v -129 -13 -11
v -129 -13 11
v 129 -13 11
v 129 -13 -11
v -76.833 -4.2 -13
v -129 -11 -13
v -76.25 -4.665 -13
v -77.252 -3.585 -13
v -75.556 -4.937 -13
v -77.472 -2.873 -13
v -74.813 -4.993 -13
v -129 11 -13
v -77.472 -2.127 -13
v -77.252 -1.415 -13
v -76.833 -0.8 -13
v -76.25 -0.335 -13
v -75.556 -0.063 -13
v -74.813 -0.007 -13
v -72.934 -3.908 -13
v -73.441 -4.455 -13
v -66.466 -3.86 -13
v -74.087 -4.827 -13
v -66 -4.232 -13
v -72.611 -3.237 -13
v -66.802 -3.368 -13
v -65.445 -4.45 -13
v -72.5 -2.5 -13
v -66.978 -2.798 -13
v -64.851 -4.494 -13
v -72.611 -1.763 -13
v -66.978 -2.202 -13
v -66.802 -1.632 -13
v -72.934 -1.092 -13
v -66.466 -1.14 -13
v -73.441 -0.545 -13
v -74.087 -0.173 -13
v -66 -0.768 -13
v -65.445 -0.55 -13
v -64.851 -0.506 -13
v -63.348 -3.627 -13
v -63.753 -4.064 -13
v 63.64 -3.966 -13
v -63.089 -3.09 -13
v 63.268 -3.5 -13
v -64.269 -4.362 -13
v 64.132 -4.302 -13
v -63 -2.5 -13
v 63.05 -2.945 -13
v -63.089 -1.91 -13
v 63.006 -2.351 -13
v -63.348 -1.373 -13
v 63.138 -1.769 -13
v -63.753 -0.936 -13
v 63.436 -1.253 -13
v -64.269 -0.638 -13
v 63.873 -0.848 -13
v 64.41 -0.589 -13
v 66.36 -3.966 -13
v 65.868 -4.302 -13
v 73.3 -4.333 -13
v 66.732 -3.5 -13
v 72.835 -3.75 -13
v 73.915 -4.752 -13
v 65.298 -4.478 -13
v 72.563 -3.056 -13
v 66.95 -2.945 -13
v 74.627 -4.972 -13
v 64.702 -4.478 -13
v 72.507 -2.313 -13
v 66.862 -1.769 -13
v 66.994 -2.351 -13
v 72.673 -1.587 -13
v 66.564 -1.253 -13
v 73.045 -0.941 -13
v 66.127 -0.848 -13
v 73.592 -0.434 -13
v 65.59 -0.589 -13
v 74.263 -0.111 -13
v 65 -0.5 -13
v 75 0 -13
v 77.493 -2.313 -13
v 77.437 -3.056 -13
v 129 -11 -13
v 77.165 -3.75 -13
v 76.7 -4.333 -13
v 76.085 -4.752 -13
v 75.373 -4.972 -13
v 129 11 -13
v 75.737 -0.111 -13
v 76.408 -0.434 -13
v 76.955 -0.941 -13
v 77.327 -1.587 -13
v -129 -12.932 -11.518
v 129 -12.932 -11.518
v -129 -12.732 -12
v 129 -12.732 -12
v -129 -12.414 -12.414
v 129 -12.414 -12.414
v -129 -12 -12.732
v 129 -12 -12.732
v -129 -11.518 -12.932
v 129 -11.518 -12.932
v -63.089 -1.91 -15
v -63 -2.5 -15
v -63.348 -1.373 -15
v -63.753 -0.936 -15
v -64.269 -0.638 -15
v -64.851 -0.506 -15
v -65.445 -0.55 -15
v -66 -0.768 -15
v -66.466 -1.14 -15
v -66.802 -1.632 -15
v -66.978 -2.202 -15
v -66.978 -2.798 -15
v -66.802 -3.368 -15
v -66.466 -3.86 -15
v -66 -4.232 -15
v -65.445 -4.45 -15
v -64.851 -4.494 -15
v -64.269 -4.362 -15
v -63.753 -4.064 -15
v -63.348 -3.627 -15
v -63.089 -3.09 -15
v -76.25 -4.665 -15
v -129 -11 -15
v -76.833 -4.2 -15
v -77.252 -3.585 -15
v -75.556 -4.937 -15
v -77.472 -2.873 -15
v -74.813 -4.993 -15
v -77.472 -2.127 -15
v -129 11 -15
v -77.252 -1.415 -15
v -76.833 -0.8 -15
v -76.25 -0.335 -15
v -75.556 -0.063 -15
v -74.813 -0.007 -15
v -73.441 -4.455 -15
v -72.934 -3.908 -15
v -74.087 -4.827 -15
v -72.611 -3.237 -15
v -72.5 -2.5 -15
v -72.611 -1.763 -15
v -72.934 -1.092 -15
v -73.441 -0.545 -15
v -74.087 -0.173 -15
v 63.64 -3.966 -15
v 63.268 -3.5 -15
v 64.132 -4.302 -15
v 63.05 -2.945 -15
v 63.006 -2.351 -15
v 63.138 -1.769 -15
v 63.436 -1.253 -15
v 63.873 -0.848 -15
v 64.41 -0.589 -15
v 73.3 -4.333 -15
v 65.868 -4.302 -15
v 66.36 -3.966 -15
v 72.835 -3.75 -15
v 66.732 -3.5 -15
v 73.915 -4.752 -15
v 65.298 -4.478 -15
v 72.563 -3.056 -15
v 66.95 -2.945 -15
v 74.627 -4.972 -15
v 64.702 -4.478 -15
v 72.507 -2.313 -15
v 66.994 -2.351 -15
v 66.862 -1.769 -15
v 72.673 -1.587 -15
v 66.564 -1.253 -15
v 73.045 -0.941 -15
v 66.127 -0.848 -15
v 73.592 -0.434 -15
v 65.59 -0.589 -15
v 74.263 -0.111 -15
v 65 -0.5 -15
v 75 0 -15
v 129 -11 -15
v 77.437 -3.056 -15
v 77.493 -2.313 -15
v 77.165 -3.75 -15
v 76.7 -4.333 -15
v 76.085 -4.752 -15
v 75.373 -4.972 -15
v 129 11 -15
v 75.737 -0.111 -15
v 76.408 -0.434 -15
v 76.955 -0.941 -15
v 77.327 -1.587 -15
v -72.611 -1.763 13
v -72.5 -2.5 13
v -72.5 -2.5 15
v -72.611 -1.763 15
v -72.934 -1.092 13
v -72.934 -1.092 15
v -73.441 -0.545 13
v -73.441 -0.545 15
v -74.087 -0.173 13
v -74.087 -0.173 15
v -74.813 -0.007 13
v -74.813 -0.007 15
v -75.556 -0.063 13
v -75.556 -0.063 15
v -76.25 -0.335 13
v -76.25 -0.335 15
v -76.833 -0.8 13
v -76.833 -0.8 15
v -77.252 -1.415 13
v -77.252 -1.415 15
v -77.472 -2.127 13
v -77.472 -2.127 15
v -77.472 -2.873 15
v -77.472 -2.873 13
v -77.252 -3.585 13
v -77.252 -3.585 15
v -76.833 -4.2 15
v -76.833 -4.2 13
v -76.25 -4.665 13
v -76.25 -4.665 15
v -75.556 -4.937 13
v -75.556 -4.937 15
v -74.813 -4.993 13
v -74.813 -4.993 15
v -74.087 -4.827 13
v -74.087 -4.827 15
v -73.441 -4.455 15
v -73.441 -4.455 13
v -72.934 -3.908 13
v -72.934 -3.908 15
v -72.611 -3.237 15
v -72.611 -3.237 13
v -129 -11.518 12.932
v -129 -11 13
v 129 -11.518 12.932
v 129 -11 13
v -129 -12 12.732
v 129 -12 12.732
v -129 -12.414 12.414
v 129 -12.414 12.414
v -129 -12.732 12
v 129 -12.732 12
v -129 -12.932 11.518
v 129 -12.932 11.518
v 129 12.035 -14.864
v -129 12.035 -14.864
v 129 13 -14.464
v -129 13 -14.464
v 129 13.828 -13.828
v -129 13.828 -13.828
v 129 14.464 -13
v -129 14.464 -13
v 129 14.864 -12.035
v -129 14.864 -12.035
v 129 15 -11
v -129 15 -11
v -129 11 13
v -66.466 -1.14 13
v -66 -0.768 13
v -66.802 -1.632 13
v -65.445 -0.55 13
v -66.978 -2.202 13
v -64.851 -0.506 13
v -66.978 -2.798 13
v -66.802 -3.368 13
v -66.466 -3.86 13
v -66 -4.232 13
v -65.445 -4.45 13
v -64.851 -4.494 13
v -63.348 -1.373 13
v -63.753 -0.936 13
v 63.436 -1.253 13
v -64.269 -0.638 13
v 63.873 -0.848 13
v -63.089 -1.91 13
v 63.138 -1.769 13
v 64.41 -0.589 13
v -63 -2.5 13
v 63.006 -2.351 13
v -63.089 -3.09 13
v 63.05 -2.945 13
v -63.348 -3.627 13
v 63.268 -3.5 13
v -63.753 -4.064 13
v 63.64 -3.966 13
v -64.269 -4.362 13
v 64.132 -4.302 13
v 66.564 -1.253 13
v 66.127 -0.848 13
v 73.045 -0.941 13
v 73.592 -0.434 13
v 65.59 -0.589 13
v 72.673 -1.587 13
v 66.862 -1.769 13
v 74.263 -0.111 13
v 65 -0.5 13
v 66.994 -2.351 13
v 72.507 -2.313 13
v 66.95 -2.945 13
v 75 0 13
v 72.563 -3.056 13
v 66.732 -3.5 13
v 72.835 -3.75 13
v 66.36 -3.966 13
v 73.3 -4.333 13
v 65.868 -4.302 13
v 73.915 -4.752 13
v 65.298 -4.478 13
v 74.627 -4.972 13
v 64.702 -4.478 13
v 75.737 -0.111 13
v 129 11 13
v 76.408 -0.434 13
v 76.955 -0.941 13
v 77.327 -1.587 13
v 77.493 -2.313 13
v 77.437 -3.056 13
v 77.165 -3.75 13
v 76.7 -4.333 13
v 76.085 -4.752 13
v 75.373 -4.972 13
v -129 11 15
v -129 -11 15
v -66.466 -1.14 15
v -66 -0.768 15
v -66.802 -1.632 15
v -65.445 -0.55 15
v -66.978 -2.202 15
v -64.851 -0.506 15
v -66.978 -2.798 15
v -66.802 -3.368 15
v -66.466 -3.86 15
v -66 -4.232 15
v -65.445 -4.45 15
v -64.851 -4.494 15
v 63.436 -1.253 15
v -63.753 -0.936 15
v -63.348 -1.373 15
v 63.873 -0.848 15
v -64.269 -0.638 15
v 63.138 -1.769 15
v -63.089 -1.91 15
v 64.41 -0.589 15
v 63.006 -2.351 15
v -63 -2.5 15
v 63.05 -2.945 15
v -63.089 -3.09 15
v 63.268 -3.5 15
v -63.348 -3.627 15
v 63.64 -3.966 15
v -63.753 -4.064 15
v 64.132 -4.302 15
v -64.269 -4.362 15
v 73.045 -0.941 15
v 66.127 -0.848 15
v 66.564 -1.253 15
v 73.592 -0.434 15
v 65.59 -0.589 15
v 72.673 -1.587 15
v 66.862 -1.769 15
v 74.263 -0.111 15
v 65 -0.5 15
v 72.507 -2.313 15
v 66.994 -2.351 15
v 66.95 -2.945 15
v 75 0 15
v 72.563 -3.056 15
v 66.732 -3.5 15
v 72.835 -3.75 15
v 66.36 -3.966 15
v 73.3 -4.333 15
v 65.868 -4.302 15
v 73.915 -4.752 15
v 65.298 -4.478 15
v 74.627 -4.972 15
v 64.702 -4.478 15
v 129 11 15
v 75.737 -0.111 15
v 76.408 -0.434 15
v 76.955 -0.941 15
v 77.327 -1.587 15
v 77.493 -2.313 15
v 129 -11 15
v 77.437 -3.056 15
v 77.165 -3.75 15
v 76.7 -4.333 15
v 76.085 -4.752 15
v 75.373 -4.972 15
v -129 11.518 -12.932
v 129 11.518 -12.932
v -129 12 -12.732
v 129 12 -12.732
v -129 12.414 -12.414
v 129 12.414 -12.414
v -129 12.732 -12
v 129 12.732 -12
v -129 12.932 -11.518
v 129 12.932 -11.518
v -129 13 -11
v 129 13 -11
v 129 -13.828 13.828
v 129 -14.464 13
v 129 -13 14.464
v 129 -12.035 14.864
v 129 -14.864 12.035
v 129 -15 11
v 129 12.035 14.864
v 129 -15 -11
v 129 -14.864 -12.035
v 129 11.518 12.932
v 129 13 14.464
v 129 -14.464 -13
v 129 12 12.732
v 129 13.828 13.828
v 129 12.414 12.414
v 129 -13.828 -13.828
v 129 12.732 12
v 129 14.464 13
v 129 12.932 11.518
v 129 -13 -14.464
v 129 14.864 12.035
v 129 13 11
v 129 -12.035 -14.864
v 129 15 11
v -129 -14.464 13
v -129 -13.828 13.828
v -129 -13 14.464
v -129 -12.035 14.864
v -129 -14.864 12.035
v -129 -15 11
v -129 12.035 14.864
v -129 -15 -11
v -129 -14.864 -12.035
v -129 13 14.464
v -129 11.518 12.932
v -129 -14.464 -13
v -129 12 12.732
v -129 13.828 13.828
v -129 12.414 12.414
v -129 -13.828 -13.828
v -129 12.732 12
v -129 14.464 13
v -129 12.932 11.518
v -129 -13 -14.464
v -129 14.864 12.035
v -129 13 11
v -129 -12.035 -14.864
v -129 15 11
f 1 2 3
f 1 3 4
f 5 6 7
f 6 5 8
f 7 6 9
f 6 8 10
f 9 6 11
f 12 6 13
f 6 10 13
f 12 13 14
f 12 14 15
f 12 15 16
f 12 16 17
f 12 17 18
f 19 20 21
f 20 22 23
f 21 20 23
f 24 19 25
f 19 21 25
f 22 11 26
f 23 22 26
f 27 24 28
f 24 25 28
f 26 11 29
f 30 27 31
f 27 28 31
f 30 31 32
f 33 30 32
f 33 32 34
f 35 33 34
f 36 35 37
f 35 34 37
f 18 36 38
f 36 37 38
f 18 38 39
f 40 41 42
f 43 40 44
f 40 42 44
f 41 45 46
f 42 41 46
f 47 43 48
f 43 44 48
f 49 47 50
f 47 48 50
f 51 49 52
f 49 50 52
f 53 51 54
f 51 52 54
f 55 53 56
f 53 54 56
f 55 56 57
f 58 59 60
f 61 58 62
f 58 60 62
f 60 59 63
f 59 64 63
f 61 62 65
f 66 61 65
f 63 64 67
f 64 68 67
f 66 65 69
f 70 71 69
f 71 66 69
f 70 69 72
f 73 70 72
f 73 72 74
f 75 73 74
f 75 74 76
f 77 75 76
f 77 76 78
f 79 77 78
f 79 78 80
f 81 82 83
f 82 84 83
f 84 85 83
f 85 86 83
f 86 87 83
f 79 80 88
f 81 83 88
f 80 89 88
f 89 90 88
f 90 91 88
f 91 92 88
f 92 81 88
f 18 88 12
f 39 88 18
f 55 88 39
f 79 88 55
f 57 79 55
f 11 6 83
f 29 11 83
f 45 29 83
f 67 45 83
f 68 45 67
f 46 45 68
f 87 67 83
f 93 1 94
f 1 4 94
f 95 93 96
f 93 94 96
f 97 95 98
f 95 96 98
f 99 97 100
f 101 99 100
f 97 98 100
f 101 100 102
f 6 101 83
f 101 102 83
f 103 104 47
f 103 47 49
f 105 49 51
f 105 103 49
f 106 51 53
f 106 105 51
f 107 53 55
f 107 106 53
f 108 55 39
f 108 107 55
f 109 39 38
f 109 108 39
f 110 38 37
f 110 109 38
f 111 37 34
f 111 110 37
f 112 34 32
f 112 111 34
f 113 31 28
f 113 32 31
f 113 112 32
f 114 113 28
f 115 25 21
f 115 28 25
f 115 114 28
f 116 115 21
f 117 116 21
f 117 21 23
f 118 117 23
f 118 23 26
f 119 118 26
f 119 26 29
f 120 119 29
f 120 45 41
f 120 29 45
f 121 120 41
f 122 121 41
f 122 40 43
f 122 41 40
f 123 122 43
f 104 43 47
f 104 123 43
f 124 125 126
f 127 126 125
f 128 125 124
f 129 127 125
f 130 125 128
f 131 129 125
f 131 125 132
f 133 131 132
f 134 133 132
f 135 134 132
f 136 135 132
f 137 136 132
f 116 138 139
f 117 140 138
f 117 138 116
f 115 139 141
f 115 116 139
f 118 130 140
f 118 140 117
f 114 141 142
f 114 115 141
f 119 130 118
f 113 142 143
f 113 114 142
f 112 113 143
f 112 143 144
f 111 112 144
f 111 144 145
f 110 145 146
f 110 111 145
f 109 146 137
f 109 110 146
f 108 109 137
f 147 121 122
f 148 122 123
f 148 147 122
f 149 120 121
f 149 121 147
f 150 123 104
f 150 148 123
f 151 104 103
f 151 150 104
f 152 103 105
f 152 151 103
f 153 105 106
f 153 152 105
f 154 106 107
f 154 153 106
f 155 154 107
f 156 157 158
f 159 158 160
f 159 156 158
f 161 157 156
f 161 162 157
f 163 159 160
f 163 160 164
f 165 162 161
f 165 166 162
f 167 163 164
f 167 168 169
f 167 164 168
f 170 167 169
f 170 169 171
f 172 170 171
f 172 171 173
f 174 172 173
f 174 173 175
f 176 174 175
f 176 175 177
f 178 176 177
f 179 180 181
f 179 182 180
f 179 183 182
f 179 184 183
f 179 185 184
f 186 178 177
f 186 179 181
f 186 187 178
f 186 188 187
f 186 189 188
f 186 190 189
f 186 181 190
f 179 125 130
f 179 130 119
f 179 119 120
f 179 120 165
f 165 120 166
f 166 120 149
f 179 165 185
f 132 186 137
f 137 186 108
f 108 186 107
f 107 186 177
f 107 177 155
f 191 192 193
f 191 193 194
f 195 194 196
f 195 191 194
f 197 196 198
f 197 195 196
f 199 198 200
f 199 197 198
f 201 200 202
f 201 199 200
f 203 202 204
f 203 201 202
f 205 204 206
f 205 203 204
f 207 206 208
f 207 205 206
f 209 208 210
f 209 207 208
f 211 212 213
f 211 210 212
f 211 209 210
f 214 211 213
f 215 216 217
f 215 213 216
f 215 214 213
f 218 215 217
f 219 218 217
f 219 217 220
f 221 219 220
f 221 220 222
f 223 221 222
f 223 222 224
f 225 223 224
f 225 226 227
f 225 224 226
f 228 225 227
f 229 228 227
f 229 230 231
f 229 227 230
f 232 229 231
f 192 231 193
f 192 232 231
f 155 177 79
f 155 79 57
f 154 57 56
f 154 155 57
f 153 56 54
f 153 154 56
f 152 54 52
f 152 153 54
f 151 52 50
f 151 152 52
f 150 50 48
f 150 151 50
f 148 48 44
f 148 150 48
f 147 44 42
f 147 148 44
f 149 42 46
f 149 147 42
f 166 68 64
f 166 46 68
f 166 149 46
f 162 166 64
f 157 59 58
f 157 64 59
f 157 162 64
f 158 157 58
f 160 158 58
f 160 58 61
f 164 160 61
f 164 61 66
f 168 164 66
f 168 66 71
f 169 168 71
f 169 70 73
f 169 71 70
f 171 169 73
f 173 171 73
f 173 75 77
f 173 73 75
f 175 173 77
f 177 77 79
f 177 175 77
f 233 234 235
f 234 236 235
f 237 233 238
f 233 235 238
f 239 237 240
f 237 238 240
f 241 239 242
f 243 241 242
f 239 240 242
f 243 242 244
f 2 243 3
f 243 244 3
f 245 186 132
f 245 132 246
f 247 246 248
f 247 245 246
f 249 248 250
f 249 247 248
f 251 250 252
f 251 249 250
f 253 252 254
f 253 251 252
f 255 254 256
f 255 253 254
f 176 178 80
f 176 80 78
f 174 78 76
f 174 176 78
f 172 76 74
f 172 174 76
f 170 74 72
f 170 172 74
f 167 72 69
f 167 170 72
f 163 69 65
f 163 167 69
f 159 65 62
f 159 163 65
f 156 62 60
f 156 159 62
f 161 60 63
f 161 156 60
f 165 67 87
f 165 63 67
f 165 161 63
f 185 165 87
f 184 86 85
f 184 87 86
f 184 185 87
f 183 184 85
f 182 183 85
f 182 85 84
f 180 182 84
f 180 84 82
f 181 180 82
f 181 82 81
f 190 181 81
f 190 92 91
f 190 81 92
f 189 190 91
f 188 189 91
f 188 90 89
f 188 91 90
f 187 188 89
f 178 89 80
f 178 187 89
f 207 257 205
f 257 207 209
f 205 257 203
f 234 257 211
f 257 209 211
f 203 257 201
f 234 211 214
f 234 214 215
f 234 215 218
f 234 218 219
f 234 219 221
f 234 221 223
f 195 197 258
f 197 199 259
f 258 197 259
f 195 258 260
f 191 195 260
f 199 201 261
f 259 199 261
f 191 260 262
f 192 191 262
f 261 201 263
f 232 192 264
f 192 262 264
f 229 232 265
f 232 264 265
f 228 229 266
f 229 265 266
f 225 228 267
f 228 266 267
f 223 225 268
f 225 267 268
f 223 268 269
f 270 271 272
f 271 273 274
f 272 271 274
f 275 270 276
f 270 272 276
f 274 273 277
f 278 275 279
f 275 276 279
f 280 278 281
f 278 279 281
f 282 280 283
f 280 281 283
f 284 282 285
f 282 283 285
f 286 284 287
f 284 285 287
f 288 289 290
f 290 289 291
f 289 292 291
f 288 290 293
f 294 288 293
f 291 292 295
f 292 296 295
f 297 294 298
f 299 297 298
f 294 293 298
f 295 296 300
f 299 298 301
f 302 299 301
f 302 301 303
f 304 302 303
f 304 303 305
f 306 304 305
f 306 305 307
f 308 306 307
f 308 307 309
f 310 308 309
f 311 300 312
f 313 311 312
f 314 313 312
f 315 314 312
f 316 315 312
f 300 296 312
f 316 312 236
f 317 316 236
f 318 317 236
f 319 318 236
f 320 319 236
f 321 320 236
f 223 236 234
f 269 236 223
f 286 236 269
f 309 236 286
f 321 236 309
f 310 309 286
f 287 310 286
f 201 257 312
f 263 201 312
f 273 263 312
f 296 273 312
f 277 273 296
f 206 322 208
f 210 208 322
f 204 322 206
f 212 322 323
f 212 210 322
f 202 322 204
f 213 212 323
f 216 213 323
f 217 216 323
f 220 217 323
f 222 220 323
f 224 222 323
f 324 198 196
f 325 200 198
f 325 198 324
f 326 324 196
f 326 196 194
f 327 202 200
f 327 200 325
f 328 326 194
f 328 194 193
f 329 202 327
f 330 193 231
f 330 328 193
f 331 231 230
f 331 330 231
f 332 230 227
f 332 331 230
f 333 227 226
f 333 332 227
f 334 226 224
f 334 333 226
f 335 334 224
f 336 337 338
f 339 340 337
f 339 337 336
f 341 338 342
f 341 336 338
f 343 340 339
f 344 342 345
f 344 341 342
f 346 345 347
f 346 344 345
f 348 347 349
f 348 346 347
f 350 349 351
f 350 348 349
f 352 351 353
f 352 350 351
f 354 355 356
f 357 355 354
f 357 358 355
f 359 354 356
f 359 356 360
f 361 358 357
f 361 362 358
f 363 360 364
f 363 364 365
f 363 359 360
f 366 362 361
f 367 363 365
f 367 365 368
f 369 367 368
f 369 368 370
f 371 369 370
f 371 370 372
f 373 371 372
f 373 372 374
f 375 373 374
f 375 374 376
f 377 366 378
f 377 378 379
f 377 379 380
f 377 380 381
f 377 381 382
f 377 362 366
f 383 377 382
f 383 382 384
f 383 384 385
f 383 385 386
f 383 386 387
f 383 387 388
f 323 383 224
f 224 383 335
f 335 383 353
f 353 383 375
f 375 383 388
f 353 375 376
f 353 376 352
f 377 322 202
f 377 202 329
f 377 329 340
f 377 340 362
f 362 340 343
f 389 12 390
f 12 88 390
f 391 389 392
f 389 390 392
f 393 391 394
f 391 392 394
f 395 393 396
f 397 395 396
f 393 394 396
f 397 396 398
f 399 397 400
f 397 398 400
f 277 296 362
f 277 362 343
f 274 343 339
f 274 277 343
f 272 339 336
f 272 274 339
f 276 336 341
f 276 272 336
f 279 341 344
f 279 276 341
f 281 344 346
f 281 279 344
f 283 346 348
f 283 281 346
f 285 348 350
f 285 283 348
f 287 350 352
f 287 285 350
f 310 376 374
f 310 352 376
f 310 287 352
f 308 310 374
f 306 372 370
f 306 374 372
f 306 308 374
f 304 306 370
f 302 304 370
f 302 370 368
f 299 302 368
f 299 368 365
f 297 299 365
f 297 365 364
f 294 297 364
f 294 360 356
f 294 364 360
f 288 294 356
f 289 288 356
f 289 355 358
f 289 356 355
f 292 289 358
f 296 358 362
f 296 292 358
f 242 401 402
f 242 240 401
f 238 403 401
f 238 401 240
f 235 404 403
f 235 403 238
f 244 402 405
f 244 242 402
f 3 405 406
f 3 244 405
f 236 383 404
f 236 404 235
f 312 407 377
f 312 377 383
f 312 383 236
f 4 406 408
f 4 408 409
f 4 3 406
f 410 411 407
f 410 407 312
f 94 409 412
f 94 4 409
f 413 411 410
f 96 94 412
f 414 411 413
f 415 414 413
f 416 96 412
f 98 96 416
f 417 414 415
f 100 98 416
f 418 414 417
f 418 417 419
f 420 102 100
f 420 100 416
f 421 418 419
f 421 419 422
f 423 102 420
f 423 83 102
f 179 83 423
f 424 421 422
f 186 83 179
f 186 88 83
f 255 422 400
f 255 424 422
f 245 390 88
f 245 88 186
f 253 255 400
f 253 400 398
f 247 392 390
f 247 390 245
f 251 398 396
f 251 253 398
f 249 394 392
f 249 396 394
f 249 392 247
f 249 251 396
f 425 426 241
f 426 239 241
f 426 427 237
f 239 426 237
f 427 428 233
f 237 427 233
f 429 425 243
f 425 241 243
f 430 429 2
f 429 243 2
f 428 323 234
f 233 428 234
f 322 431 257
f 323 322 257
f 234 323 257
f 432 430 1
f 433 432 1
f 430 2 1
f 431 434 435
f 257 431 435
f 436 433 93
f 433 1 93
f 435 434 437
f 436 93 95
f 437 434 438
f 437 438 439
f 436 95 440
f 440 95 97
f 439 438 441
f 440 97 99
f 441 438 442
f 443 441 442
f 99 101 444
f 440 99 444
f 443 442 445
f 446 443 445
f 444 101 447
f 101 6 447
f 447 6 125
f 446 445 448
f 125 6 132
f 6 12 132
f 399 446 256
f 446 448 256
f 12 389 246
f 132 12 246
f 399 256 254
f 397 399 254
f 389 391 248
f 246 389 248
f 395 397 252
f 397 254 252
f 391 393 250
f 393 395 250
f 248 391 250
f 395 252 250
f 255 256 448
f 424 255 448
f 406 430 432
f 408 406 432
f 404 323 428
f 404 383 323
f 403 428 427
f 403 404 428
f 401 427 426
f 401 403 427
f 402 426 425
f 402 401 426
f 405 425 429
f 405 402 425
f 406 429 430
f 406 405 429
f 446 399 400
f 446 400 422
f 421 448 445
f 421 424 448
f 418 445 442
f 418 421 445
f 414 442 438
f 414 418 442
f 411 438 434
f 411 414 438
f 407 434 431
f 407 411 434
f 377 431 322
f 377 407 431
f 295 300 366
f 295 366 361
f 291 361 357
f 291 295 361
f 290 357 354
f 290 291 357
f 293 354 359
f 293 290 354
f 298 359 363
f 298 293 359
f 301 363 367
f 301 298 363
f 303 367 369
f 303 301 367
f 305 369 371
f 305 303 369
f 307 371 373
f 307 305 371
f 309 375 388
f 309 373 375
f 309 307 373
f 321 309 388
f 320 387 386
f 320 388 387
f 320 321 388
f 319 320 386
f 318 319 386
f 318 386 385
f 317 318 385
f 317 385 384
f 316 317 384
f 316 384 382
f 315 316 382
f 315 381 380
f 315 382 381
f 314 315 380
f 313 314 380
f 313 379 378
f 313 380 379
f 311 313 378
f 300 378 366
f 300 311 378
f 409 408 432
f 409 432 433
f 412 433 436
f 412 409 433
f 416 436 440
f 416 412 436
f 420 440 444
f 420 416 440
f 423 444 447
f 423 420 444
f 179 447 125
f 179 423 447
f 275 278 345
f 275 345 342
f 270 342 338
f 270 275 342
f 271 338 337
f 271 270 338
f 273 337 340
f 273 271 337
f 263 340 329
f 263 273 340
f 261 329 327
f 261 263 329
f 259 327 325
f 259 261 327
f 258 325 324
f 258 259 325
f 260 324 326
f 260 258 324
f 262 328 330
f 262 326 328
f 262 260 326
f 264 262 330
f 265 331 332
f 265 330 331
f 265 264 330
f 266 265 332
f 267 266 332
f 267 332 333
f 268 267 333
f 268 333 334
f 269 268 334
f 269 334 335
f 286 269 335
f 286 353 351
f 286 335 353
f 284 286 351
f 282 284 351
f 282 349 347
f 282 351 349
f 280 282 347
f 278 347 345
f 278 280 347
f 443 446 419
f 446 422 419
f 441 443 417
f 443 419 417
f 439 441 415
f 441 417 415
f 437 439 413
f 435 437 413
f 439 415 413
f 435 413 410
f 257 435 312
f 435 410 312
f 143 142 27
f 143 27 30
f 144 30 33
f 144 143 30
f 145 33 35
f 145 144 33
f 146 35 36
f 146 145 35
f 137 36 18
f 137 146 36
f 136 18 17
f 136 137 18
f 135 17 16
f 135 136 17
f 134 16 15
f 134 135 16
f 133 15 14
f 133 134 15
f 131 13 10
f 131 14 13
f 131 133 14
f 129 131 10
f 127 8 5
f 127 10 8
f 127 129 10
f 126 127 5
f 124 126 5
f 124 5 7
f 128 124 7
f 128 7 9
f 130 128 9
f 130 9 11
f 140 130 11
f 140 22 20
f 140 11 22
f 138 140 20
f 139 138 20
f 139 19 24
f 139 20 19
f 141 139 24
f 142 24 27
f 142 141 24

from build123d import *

# Parameters (mm, degrees)
EXTRUDE_1_DEPTH          = 129
CUT_EXTRUDE_1_DEPTH      = 131.732551417
CUT_EXTRUDE_1_DEPTH_BACK = 131.732551417
SKETCH_2_R               = 2.5
SKETCH_2_R_2             = 2


with BuildPart() as part:
    # 草图1 → 凸台-拉伸1 (new, symmetric)
    with BuildSketch(Plane(origin=(0, 0, 0), x_dir=(0, 0, -1), z_dir=(1, 0, 0))):
        with BuildLine():
            Line((-11, -15), (11, -15))
            ThreePointArc((11, -15), (13.828427125, -13.828427125), (15, -11))
            Line((15, -11), (15, 11))
            ThreePointArc((15, 11), (13.828427125, 13.828427125), (11, 15))
            Line((11, 15), (-11, 15))
            ThreePointArc((-11, 15), (-13.828427125, 13.828427125), (-15, 11))
            Line((-15, 11), (-15, -11))
            ThreePointArc((-15, -11), (-13.828427125, -13.828427125), (-11, -15))
        make_face()
        with BuildLine():
            Line((-11, -13), (11, -13))
            ThreePointArc((11, -13), (12.414213562, -12.414213562), (13, -11))
            Line((13, -11), (13, 11))
            ThreePointArc((13, 11), (12.414213562, 12.414213562), (11, 13))
            Line((11, 13), (-11, 13))
            ThreePointArc((-11, 13), (-12.414213562, 12.414213562), (-13, 11))
            Line((-13, 11), (-13, -11))
            ThreePointArc((-13, -11), (-12.414213562, -12.414213562), (-11, -13))
        make_face(mode=Mode.SUBTRACT)
    extrude(amount=EXTRUDE_1_DEPTH, both=True)

    # 草图2 → 切除-拉伸1 (cut, two sides: drawn at the far end of the back side and taken through both)
    with BuildSketch(Plane.XY.offset(-CUT_EXTRUDE_1_DEPTH_BACK)):
        with Locations((-75, -2.5)):
            Circle(SKETCH_2_R)
        with Locations(Location((75, -2.5, 0), (0, 0, 90))):
            Circle(SKETCH_2_R)
        with Locations((-65, -2.5)):
            Circle(SKETCH_2_R_2)
        with Locations(Location((65, -2.5, 0), (0, 0, 90))):
            Circle(SKETCH_2_R_2)
    extrude(amount=CUT_EXTRUDE_1_DEPTH + CUT_EXTRUDE_1_DEPTH_BACK, mode=Mode.SUBTRACT)


solid = part.part
